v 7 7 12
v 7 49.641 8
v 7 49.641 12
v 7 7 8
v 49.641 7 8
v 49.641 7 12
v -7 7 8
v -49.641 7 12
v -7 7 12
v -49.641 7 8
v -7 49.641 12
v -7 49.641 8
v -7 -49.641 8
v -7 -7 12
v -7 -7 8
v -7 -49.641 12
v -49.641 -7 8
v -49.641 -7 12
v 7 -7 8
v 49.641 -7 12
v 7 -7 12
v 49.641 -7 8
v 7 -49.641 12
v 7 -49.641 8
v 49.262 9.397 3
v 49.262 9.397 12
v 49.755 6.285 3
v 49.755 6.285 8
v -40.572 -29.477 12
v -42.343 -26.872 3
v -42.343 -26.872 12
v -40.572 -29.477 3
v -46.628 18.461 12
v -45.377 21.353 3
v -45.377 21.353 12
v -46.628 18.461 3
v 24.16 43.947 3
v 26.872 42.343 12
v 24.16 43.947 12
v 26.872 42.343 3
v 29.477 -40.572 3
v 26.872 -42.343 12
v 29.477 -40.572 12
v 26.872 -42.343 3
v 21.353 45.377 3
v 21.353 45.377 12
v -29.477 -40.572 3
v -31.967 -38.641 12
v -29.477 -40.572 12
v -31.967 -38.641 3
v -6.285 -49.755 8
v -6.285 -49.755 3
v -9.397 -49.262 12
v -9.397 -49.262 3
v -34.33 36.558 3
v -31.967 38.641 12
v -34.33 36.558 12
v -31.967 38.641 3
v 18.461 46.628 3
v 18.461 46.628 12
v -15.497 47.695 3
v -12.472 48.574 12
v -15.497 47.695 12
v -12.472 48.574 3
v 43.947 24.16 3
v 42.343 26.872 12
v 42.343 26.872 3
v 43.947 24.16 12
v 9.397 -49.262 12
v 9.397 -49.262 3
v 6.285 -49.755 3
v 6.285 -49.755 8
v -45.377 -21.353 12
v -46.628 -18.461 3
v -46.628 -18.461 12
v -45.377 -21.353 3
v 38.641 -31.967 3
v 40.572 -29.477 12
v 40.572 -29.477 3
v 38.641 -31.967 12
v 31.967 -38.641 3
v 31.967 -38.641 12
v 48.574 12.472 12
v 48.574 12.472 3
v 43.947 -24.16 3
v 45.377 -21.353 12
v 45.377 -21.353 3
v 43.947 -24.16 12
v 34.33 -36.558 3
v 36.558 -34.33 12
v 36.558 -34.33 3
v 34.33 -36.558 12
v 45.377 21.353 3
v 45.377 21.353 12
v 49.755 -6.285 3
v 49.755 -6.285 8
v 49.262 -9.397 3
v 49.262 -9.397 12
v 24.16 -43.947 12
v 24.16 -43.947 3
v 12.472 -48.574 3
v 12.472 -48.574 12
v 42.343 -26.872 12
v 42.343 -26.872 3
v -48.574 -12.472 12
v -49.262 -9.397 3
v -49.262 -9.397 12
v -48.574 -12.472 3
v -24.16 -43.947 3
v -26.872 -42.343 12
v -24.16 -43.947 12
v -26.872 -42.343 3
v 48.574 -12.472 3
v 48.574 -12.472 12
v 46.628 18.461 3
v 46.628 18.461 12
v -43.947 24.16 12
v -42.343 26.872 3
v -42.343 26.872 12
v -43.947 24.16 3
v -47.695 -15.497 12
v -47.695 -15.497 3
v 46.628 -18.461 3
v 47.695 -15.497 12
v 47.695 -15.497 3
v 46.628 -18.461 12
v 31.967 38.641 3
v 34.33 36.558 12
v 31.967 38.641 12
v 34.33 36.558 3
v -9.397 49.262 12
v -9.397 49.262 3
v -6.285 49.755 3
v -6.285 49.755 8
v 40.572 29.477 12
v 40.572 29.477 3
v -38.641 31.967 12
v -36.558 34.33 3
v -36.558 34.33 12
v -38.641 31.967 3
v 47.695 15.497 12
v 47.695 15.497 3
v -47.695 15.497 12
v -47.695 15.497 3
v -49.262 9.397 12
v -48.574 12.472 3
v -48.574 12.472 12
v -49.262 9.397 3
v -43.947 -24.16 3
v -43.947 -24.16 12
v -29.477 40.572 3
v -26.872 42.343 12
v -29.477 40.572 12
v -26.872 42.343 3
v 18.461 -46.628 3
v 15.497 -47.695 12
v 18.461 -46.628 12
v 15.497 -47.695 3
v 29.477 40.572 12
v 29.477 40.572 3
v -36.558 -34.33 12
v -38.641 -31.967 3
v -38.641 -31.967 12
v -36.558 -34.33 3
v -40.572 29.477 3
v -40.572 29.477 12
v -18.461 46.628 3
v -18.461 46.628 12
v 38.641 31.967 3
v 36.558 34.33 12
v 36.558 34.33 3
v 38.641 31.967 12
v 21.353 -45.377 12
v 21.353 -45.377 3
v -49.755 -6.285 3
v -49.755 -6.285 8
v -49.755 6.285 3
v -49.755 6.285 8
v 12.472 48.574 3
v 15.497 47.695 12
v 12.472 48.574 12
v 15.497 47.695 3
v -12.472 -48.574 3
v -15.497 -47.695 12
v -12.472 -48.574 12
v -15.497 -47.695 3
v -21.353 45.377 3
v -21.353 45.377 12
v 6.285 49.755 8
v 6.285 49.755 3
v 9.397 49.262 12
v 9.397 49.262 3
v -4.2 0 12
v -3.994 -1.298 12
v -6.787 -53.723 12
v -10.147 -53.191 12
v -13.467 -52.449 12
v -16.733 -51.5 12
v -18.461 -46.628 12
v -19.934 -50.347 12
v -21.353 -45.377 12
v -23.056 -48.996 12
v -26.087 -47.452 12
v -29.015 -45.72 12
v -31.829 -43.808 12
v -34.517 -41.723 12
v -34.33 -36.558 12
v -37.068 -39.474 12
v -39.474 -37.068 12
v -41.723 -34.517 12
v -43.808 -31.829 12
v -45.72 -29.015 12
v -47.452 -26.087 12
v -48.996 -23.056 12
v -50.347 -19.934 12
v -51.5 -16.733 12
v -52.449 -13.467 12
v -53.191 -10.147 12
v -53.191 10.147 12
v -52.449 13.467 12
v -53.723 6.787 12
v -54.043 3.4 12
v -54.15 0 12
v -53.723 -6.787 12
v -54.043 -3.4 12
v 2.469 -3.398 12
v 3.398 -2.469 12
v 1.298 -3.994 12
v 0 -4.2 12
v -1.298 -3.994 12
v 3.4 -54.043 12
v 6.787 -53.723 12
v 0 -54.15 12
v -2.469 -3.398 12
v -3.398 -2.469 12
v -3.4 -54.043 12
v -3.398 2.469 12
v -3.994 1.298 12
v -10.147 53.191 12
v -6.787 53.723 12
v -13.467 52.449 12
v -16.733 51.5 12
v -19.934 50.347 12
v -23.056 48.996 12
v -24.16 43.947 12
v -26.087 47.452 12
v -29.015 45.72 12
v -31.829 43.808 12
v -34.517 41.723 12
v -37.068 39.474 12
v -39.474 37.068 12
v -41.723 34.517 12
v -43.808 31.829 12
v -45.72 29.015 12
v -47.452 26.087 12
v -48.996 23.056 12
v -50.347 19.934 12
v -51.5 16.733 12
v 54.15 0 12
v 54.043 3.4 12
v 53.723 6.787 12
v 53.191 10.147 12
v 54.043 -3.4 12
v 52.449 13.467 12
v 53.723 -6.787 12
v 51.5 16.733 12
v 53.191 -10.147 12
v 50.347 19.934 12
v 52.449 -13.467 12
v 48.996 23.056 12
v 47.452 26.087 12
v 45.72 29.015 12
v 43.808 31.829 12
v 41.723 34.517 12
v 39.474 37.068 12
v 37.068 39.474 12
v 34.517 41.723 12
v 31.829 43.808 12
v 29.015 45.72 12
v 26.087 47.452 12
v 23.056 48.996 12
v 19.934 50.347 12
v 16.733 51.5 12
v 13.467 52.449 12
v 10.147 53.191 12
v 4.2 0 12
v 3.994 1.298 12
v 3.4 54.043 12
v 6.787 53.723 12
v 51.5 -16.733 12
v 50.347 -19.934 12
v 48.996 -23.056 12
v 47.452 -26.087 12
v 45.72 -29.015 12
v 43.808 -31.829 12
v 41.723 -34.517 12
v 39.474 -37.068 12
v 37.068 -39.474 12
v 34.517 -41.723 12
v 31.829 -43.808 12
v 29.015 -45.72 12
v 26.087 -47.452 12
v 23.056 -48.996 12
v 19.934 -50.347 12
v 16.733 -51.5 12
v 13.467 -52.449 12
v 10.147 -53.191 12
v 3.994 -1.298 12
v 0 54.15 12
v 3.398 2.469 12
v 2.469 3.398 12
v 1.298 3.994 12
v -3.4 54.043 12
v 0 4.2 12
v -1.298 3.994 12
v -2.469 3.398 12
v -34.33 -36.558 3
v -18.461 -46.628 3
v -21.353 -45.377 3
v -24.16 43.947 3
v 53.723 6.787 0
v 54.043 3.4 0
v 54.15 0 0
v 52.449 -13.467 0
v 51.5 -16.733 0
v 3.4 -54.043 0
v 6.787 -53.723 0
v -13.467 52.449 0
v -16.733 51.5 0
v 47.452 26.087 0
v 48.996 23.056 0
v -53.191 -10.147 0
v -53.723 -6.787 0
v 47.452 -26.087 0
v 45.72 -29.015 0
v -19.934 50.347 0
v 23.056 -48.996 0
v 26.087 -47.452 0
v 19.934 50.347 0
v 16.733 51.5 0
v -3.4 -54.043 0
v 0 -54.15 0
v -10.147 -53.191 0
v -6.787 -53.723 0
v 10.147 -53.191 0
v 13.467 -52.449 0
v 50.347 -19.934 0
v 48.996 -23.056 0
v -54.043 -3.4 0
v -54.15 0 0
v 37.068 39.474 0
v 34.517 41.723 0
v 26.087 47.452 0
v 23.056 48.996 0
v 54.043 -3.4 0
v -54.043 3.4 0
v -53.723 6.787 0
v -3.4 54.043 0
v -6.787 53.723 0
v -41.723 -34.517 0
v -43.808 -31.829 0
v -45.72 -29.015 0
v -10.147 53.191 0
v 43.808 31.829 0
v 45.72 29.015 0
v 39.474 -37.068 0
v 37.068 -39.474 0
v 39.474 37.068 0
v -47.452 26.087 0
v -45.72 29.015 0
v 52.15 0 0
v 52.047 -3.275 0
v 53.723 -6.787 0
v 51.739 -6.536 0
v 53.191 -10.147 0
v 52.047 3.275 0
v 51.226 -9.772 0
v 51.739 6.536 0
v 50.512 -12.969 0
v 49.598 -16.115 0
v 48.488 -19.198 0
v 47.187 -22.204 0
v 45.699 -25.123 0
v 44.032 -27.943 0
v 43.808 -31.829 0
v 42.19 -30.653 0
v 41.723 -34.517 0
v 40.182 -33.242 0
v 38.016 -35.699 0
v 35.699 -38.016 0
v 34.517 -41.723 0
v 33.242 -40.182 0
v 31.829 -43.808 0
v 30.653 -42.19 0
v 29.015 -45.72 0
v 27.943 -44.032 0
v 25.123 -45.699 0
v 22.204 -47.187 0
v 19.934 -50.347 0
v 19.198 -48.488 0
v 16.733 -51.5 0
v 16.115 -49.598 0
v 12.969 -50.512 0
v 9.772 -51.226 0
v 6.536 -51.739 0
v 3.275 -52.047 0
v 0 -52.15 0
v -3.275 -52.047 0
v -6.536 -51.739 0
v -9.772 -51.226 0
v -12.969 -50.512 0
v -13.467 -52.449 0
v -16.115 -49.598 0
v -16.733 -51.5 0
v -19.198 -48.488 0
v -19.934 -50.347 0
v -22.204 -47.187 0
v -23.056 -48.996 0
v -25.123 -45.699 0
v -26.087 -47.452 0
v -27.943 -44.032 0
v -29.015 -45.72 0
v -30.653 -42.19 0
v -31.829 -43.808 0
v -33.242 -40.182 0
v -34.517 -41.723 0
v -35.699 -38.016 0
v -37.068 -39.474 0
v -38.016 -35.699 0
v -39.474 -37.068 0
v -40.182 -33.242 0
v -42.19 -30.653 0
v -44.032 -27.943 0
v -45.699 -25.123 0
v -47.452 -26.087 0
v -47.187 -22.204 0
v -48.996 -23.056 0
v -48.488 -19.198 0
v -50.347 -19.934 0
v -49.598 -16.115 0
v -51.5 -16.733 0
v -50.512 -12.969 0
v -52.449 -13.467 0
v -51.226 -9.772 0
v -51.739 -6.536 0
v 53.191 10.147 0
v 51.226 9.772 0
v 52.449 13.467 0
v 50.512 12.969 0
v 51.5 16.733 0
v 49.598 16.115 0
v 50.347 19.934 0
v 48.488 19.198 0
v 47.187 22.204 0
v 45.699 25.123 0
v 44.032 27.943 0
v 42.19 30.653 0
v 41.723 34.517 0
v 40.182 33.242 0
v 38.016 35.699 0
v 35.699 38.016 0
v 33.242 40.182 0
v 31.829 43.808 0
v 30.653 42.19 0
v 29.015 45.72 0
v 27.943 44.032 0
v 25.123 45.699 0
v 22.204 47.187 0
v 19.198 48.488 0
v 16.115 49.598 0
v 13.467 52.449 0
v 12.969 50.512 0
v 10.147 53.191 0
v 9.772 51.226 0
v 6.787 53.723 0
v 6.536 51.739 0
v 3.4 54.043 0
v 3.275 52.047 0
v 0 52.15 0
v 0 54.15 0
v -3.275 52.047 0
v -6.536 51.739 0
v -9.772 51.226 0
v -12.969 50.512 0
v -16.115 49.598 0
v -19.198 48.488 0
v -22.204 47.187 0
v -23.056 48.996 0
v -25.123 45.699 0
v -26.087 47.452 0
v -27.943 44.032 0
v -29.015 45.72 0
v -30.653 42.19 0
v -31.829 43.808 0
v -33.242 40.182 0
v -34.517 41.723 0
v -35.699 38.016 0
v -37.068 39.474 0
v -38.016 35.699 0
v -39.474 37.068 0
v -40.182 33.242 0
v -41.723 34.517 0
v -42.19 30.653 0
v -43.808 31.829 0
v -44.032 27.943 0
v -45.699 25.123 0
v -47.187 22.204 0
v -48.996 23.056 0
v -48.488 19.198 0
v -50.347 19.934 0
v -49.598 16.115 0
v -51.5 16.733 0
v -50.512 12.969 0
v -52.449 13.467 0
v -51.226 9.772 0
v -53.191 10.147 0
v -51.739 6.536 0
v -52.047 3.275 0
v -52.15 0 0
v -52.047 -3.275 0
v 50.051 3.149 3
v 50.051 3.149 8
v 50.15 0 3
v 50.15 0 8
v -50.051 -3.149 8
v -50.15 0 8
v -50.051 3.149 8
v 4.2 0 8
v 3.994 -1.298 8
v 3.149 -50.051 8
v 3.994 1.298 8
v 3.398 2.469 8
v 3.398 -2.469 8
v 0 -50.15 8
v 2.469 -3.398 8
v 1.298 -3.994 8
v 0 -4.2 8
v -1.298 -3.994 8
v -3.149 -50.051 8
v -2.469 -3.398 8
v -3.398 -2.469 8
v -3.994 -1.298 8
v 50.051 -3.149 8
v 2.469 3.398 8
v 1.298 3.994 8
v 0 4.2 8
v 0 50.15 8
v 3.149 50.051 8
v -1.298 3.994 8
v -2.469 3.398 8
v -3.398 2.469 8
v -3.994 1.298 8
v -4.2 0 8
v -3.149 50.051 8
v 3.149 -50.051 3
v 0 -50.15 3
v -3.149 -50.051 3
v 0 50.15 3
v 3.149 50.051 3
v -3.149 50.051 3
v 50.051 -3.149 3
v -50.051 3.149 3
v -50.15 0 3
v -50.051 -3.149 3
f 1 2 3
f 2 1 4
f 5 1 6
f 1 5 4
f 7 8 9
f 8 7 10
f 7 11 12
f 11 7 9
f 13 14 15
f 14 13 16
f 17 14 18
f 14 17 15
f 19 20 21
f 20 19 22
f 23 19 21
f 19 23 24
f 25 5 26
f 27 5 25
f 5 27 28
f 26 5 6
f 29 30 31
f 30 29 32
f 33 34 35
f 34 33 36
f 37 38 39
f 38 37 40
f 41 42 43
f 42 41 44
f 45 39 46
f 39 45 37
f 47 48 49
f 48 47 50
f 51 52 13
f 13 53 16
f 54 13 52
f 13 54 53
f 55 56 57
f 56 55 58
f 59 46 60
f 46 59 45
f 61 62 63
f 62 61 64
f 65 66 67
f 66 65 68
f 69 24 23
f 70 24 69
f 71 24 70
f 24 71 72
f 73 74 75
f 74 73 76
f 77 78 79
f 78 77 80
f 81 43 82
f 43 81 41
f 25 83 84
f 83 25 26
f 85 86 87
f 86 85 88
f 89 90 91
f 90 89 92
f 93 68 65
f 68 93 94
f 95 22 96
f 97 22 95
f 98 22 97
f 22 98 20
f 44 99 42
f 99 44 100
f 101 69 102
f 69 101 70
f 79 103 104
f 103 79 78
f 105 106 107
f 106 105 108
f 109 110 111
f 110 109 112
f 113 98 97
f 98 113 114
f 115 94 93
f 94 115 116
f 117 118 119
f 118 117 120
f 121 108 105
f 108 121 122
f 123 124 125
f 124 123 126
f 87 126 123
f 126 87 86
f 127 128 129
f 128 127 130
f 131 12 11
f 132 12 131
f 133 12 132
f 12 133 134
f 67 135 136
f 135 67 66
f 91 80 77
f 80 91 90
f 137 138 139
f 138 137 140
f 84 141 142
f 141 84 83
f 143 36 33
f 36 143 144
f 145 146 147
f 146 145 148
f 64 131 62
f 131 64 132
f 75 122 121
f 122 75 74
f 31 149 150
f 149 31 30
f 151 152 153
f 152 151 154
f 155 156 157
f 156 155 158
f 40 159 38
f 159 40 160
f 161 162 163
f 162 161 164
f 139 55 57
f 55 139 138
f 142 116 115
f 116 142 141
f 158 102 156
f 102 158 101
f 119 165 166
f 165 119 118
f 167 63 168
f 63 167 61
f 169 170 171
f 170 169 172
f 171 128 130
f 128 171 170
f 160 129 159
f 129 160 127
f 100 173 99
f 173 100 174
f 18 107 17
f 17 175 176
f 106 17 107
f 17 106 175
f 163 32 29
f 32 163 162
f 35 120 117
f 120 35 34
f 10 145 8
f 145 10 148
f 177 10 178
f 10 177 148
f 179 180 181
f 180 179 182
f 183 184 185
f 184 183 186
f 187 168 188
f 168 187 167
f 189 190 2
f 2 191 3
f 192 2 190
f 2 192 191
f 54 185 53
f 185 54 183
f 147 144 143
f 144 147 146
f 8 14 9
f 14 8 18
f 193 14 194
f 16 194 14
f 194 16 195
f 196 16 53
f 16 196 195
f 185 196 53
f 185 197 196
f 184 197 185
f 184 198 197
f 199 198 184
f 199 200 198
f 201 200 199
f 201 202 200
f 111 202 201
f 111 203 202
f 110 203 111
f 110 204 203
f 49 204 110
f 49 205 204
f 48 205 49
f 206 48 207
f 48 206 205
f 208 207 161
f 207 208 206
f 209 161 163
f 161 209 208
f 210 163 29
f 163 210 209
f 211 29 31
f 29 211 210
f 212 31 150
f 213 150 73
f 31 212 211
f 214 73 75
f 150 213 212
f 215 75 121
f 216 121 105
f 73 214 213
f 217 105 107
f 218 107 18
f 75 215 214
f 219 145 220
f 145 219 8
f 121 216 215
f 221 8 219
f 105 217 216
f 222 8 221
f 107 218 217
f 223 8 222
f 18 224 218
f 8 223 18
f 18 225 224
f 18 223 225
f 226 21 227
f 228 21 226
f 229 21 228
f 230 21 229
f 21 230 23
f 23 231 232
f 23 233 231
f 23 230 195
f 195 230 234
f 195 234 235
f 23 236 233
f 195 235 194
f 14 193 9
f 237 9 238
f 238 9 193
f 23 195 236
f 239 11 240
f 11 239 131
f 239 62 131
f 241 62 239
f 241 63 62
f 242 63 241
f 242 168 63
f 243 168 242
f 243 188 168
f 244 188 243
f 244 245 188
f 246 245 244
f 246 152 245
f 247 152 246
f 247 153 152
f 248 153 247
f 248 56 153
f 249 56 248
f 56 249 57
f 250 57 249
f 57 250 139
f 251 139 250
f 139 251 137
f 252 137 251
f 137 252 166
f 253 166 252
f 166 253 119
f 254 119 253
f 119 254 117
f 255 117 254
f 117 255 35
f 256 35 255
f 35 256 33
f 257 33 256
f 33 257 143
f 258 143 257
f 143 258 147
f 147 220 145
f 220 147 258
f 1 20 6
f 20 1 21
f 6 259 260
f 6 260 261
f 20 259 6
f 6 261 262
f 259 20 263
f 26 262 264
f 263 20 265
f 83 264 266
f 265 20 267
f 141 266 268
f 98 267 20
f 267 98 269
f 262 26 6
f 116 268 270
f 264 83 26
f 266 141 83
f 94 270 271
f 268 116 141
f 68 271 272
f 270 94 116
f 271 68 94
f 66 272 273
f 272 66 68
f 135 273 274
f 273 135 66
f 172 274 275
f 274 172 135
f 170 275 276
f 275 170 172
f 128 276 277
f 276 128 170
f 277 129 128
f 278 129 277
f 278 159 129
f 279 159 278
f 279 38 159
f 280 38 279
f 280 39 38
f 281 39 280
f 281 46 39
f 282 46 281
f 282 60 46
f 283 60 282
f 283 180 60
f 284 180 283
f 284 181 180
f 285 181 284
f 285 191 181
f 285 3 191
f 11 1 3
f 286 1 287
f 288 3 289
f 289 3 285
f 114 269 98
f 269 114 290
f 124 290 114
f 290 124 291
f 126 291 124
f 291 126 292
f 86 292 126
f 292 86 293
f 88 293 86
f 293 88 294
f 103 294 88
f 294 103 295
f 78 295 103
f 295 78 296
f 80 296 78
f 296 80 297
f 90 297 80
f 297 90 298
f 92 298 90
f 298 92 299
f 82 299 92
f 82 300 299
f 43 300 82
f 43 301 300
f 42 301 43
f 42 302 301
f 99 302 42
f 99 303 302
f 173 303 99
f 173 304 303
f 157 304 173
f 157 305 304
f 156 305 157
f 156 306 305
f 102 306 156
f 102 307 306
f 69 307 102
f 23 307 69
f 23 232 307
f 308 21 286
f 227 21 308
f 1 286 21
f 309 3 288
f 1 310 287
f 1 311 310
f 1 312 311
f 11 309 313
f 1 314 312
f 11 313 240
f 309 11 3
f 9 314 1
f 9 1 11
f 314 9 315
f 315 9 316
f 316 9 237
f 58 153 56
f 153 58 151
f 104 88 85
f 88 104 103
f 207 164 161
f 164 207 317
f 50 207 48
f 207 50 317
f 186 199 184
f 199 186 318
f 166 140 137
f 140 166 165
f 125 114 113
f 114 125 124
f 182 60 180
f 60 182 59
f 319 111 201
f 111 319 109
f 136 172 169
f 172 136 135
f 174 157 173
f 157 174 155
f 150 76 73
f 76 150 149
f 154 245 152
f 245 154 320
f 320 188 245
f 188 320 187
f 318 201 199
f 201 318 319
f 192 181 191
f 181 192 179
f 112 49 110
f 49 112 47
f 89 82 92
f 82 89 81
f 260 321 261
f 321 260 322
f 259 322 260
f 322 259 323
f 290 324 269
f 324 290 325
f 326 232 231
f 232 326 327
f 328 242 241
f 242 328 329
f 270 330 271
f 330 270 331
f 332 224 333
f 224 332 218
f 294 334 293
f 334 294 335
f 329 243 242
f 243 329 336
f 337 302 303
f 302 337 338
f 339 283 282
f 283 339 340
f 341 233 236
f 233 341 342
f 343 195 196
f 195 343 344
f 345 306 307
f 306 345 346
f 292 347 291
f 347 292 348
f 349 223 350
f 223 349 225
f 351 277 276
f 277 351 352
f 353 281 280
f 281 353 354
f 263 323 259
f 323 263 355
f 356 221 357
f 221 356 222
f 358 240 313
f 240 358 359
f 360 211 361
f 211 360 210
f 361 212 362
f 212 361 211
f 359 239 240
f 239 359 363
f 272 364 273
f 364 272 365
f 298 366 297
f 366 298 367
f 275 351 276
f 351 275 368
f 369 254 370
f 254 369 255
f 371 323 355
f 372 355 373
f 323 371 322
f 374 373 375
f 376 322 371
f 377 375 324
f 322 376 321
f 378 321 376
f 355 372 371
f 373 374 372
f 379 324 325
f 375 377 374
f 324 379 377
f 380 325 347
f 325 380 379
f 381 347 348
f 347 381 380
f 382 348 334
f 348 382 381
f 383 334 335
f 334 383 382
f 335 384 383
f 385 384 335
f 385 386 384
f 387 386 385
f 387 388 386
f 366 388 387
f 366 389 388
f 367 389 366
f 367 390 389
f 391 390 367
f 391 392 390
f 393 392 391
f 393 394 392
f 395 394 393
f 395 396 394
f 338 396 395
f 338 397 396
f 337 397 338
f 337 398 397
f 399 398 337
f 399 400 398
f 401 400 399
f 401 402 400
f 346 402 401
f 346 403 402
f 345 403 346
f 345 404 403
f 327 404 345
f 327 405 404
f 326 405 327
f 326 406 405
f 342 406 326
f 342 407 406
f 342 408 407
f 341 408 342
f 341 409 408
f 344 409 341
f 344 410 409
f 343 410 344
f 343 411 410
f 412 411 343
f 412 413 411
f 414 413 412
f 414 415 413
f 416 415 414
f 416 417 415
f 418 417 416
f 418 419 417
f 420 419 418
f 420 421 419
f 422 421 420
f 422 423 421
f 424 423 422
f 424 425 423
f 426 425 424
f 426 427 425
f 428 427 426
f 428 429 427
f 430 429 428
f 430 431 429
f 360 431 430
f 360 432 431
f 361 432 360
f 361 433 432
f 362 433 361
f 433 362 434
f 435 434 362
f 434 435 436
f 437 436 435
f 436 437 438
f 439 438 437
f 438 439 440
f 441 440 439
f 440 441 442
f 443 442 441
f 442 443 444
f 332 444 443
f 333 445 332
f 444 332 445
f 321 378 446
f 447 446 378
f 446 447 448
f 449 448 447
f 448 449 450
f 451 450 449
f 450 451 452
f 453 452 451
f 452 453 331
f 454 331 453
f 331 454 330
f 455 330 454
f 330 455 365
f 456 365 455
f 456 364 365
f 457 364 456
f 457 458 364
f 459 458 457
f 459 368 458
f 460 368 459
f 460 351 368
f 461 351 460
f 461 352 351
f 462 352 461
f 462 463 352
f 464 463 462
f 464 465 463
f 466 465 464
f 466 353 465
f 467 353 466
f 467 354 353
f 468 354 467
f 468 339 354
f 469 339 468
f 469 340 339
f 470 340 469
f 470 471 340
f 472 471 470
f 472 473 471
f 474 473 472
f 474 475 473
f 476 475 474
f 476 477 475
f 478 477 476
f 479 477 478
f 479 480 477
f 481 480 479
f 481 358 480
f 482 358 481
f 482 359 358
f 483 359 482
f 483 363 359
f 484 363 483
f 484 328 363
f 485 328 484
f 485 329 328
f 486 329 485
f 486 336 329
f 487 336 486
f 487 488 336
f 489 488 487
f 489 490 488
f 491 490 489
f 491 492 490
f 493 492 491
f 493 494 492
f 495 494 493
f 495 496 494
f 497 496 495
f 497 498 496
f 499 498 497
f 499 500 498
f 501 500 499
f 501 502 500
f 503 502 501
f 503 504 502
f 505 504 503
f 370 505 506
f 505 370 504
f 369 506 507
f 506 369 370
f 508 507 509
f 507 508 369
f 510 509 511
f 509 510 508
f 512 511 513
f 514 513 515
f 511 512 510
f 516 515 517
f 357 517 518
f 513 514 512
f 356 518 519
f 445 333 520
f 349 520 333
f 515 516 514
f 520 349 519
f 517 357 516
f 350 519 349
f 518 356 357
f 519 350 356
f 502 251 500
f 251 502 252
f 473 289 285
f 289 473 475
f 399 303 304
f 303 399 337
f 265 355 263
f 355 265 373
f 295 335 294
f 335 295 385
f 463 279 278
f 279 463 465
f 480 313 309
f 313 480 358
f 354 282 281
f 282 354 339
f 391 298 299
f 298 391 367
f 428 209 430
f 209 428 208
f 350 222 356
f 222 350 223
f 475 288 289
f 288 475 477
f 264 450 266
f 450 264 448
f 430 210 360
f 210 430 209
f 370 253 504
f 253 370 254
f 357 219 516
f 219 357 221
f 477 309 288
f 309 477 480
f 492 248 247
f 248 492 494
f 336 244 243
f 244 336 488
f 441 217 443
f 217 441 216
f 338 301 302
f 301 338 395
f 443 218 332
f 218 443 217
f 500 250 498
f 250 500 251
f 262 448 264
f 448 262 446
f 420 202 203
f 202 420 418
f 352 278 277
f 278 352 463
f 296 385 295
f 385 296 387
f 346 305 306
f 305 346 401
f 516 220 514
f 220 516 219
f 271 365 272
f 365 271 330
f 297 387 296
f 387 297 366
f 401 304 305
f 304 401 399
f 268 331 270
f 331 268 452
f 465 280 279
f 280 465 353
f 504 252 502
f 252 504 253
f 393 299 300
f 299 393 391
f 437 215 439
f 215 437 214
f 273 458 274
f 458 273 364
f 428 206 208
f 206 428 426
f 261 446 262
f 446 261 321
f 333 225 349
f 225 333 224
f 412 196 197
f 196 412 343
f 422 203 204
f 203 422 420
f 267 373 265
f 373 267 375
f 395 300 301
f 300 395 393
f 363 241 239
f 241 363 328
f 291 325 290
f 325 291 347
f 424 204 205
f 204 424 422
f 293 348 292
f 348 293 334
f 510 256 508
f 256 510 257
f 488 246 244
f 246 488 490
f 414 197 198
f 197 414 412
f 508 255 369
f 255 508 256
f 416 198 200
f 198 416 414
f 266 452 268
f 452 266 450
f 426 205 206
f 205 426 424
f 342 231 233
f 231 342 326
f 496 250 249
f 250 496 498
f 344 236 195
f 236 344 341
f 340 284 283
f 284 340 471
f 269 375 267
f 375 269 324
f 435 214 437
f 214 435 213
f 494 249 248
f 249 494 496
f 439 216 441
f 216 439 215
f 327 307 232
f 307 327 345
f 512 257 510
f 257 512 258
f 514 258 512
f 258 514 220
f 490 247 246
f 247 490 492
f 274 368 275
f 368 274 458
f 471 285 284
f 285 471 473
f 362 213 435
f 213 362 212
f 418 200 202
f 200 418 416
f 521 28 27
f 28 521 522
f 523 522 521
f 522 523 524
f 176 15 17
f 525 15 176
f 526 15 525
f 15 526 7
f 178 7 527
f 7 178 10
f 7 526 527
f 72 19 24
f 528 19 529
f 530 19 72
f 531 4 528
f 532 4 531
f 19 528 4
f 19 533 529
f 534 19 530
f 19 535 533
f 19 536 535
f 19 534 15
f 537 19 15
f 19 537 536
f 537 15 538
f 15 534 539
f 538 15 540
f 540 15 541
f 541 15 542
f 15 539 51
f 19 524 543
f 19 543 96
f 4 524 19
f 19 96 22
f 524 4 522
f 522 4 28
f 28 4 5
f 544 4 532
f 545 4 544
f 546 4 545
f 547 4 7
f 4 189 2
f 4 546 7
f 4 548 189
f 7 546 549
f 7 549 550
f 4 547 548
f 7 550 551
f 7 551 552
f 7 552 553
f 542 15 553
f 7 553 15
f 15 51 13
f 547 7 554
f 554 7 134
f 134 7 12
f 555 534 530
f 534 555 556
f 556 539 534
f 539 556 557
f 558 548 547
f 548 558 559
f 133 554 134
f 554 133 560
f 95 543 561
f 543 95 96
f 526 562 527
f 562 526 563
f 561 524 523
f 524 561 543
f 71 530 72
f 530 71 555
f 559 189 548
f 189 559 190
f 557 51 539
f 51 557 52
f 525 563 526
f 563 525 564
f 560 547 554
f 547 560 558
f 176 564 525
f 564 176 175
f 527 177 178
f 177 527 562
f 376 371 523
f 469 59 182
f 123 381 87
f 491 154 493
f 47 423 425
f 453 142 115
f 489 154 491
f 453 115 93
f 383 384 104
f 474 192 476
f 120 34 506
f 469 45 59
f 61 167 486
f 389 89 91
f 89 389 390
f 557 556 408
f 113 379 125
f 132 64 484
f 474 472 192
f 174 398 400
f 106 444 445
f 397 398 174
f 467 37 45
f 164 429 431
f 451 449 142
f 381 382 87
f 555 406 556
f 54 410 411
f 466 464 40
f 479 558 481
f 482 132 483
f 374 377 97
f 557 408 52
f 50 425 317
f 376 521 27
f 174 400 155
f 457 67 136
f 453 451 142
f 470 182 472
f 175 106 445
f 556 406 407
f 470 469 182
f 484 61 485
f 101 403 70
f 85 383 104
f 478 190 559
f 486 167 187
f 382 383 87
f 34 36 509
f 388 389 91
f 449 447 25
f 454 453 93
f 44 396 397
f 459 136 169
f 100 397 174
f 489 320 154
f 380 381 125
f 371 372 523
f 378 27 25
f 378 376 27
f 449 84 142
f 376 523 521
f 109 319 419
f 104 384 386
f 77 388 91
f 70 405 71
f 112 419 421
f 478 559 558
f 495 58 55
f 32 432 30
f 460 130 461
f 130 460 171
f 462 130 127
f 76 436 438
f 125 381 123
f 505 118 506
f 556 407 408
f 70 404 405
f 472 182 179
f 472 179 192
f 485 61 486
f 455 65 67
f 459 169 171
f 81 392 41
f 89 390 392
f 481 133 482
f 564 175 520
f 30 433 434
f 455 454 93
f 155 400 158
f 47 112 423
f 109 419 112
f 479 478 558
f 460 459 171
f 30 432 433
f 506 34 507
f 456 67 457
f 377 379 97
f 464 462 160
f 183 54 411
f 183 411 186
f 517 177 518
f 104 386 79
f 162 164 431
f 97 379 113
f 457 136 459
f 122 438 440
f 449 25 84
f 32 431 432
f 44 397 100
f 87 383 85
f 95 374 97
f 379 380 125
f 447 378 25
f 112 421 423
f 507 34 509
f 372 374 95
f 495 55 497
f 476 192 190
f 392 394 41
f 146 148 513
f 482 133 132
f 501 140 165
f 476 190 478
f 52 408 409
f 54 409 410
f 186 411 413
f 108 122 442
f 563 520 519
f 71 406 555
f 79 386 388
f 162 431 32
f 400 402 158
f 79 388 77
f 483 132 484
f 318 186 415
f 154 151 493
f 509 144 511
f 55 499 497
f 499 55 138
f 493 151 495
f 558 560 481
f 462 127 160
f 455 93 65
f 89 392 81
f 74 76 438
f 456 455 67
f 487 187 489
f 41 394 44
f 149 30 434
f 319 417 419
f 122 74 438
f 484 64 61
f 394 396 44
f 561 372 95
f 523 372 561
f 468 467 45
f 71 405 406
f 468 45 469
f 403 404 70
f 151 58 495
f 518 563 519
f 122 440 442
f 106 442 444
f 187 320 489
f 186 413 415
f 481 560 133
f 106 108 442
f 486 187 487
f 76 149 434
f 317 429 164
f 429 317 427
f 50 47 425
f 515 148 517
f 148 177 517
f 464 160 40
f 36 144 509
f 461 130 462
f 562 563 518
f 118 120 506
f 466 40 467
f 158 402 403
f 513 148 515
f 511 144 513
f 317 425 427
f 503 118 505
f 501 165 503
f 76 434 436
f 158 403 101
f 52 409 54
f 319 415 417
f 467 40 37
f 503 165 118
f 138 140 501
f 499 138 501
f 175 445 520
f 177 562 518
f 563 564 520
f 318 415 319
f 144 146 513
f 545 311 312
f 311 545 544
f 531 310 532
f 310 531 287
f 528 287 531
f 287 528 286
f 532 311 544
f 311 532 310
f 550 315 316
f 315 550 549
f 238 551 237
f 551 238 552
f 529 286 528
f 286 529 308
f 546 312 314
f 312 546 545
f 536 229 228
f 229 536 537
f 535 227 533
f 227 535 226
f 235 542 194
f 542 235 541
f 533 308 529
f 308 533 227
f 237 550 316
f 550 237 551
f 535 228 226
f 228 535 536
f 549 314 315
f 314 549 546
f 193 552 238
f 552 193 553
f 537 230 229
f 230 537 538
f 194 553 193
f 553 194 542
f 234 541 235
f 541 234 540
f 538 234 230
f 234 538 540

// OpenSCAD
d=100.3;

ep=4;
epc=4;

h=8;


difference()
{
cylinder(ep+h,d/2+epc,d/2+epc,$fn=100);
cylinder(h,d/2,d/2,$fn=100);
cylinder(3,d/2+2,d/2,$fn=100);
cylinder(ep+h,4.2,4.2,$fn=20);

intersection()
{
cylinder(h+ep,d/2,d/2,$fn=100);
for(i=[0:1:3])
{
    rotate([0,0,i*360/4]) translate([7,7,0]) cube([d/2,d/2,h+ep+.1]);
}
}
}
